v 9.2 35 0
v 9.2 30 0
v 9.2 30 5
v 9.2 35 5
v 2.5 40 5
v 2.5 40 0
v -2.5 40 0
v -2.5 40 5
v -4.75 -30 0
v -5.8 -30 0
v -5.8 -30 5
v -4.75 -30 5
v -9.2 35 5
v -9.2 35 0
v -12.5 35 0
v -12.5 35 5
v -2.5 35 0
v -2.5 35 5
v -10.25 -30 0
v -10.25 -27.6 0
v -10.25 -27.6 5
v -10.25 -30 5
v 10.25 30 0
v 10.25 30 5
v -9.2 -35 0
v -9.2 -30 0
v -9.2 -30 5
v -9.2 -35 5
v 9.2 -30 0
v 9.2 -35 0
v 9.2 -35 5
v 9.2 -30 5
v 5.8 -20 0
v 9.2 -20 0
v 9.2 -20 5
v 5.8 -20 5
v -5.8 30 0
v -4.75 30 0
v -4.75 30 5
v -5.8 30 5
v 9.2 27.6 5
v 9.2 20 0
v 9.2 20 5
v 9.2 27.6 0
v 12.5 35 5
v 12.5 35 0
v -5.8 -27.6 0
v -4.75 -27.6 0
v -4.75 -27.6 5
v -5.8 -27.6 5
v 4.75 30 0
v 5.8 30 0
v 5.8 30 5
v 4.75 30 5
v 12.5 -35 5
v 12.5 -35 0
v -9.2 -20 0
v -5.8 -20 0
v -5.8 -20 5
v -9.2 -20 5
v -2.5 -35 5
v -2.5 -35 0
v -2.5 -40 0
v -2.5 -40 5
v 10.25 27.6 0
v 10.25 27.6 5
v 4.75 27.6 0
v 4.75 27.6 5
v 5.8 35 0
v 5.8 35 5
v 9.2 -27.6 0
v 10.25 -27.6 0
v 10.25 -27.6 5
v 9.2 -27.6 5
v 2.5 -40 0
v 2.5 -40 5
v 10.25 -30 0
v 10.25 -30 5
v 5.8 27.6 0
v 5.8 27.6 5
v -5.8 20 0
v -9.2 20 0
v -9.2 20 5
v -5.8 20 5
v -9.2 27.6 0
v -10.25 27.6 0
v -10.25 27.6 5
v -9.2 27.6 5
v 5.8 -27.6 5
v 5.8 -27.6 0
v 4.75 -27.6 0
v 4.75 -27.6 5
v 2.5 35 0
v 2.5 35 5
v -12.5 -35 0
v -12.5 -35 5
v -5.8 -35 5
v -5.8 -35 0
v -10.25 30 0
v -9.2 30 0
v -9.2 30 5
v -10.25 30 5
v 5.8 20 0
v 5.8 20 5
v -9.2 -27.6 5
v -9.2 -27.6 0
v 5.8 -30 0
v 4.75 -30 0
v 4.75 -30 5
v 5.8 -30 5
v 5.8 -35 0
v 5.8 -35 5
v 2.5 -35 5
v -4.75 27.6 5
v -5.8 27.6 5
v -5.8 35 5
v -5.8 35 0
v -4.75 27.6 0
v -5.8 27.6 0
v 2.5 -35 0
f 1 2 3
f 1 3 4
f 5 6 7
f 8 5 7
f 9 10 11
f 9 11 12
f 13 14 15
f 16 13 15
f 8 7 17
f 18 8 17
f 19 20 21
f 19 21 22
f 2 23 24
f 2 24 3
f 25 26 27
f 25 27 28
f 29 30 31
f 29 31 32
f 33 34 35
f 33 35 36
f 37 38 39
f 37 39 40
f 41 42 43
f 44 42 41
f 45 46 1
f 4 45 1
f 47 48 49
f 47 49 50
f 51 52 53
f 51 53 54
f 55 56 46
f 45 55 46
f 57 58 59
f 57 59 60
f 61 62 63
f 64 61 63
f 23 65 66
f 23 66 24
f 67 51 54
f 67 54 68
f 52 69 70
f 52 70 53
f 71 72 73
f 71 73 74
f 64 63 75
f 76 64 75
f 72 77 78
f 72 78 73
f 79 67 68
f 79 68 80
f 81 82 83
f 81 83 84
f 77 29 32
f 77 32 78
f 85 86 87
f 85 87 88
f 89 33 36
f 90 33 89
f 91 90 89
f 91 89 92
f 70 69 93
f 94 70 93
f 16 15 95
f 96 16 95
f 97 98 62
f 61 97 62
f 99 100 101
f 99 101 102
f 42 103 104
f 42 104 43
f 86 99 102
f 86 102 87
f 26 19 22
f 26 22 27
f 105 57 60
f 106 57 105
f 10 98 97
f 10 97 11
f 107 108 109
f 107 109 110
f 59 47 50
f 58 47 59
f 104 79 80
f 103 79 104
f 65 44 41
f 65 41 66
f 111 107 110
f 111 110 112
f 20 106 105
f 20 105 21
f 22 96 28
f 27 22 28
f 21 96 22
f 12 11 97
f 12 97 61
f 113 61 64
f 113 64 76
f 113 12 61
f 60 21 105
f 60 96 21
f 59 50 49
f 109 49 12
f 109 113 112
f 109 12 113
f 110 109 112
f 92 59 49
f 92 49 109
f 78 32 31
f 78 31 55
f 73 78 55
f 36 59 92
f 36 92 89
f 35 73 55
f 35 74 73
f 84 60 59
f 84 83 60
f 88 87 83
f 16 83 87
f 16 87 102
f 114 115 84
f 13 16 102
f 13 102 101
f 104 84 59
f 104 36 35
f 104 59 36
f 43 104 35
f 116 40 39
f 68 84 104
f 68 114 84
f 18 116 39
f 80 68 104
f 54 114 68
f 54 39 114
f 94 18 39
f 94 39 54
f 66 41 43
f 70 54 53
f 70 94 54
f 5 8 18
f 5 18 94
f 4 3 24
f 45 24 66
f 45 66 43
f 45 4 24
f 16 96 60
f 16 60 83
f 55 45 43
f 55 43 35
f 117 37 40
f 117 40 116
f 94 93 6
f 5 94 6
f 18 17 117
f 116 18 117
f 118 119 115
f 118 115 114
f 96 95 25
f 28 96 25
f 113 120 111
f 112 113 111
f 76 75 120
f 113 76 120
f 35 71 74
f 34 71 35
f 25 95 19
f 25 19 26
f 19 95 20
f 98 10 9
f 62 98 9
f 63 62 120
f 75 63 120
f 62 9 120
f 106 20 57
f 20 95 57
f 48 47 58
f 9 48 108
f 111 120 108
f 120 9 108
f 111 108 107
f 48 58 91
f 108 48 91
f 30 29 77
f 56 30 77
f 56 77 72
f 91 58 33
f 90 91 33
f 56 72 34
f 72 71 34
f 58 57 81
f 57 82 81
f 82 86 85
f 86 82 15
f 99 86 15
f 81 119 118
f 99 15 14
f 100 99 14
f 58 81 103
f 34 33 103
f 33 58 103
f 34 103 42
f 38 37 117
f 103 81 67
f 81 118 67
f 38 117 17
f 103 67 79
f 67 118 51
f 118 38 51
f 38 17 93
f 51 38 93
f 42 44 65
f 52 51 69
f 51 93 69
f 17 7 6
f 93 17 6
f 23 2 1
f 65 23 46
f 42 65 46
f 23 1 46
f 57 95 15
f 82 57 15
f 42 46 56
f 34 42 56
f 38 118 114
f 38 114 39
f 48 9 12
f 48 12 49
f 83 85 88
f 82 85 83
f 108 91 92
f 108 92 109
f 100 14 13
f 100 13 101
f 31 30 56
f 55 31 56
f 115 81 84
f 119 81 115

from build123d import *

# Parameters (mm, degrees)
BOSS_EXTRUDE1_DEPTH = 5
CUT_EXTRUDE1_DEPTH  = 10


with BuildPart() as part:
    # Sketch1 → Boss-Extrude1 (new body)
    with BuildSketch(Plane.XY):
        Polygon((-12.5, 35), (-12.5, -35), (-2.5, -35), (-2.5, -40), (2.5, -40), (2.5, -35), (12.5, -35), (12.5, 35), (2.5, 35), (2.5, 40), (-2.5, 40), (-2.5, 35), align=None)
    extrude(amount=BOSS_EXTRUDE1_DEPTH)

    # Sketch2 → Cut-Extrude1 (cut)
    with BuildSketch(Plane(origin=(0, 0, 0), x_dir=(-1, 0, 0), z_dir=(0, 0, -1))):
        Polygon((5.8, 35), (9.2, 35), (9.2, 30), (10.25, 30), (10.25, 27.6), (9.2, 27.6), (9.2, 20), (5.8, 20), (5.8, 27.6), (4.75, 27.6), (4.75, 30), (5.8, 30), align=None)
        Polygon((-5.8, 35), (-5.8, 30), (-4.75, 30), (-4.75, 27.6), (-5.8, 27.6), (-5.8, 20), (-9.2, 20), (-9.2, 27.6), (-10.25, 27.6), (-10.25, 30), (-9.2, 30), (-9.2, 35), align=None)
        Polygon((-5.8, -35), (-9.2, -35), (-9.2, -30), (-10.25, -30), (-10.25, -27.6), (-9.2, -27.6), (-9.2, -20), (-5.8, -20), (-5.8, -27.6), (-4.75, -27.6), (-4.75, -30), (-5.8, -30), align=None)
        Polygon((5.8, -35), (5.8, -30), (4.75, -30), (4.75, -27.6), (5.8, -27.6), (5.8, -20), (9.2, -20), (9.2, -27.6), (10.25, -27.6), (10.25, -30), (9.2, -30), (9.2, -35), align=None)
    extrude(amount=-CUT_EXTRUDE1_DEPTH, mode=Mode.SUBTRACT)


solid = part.part
